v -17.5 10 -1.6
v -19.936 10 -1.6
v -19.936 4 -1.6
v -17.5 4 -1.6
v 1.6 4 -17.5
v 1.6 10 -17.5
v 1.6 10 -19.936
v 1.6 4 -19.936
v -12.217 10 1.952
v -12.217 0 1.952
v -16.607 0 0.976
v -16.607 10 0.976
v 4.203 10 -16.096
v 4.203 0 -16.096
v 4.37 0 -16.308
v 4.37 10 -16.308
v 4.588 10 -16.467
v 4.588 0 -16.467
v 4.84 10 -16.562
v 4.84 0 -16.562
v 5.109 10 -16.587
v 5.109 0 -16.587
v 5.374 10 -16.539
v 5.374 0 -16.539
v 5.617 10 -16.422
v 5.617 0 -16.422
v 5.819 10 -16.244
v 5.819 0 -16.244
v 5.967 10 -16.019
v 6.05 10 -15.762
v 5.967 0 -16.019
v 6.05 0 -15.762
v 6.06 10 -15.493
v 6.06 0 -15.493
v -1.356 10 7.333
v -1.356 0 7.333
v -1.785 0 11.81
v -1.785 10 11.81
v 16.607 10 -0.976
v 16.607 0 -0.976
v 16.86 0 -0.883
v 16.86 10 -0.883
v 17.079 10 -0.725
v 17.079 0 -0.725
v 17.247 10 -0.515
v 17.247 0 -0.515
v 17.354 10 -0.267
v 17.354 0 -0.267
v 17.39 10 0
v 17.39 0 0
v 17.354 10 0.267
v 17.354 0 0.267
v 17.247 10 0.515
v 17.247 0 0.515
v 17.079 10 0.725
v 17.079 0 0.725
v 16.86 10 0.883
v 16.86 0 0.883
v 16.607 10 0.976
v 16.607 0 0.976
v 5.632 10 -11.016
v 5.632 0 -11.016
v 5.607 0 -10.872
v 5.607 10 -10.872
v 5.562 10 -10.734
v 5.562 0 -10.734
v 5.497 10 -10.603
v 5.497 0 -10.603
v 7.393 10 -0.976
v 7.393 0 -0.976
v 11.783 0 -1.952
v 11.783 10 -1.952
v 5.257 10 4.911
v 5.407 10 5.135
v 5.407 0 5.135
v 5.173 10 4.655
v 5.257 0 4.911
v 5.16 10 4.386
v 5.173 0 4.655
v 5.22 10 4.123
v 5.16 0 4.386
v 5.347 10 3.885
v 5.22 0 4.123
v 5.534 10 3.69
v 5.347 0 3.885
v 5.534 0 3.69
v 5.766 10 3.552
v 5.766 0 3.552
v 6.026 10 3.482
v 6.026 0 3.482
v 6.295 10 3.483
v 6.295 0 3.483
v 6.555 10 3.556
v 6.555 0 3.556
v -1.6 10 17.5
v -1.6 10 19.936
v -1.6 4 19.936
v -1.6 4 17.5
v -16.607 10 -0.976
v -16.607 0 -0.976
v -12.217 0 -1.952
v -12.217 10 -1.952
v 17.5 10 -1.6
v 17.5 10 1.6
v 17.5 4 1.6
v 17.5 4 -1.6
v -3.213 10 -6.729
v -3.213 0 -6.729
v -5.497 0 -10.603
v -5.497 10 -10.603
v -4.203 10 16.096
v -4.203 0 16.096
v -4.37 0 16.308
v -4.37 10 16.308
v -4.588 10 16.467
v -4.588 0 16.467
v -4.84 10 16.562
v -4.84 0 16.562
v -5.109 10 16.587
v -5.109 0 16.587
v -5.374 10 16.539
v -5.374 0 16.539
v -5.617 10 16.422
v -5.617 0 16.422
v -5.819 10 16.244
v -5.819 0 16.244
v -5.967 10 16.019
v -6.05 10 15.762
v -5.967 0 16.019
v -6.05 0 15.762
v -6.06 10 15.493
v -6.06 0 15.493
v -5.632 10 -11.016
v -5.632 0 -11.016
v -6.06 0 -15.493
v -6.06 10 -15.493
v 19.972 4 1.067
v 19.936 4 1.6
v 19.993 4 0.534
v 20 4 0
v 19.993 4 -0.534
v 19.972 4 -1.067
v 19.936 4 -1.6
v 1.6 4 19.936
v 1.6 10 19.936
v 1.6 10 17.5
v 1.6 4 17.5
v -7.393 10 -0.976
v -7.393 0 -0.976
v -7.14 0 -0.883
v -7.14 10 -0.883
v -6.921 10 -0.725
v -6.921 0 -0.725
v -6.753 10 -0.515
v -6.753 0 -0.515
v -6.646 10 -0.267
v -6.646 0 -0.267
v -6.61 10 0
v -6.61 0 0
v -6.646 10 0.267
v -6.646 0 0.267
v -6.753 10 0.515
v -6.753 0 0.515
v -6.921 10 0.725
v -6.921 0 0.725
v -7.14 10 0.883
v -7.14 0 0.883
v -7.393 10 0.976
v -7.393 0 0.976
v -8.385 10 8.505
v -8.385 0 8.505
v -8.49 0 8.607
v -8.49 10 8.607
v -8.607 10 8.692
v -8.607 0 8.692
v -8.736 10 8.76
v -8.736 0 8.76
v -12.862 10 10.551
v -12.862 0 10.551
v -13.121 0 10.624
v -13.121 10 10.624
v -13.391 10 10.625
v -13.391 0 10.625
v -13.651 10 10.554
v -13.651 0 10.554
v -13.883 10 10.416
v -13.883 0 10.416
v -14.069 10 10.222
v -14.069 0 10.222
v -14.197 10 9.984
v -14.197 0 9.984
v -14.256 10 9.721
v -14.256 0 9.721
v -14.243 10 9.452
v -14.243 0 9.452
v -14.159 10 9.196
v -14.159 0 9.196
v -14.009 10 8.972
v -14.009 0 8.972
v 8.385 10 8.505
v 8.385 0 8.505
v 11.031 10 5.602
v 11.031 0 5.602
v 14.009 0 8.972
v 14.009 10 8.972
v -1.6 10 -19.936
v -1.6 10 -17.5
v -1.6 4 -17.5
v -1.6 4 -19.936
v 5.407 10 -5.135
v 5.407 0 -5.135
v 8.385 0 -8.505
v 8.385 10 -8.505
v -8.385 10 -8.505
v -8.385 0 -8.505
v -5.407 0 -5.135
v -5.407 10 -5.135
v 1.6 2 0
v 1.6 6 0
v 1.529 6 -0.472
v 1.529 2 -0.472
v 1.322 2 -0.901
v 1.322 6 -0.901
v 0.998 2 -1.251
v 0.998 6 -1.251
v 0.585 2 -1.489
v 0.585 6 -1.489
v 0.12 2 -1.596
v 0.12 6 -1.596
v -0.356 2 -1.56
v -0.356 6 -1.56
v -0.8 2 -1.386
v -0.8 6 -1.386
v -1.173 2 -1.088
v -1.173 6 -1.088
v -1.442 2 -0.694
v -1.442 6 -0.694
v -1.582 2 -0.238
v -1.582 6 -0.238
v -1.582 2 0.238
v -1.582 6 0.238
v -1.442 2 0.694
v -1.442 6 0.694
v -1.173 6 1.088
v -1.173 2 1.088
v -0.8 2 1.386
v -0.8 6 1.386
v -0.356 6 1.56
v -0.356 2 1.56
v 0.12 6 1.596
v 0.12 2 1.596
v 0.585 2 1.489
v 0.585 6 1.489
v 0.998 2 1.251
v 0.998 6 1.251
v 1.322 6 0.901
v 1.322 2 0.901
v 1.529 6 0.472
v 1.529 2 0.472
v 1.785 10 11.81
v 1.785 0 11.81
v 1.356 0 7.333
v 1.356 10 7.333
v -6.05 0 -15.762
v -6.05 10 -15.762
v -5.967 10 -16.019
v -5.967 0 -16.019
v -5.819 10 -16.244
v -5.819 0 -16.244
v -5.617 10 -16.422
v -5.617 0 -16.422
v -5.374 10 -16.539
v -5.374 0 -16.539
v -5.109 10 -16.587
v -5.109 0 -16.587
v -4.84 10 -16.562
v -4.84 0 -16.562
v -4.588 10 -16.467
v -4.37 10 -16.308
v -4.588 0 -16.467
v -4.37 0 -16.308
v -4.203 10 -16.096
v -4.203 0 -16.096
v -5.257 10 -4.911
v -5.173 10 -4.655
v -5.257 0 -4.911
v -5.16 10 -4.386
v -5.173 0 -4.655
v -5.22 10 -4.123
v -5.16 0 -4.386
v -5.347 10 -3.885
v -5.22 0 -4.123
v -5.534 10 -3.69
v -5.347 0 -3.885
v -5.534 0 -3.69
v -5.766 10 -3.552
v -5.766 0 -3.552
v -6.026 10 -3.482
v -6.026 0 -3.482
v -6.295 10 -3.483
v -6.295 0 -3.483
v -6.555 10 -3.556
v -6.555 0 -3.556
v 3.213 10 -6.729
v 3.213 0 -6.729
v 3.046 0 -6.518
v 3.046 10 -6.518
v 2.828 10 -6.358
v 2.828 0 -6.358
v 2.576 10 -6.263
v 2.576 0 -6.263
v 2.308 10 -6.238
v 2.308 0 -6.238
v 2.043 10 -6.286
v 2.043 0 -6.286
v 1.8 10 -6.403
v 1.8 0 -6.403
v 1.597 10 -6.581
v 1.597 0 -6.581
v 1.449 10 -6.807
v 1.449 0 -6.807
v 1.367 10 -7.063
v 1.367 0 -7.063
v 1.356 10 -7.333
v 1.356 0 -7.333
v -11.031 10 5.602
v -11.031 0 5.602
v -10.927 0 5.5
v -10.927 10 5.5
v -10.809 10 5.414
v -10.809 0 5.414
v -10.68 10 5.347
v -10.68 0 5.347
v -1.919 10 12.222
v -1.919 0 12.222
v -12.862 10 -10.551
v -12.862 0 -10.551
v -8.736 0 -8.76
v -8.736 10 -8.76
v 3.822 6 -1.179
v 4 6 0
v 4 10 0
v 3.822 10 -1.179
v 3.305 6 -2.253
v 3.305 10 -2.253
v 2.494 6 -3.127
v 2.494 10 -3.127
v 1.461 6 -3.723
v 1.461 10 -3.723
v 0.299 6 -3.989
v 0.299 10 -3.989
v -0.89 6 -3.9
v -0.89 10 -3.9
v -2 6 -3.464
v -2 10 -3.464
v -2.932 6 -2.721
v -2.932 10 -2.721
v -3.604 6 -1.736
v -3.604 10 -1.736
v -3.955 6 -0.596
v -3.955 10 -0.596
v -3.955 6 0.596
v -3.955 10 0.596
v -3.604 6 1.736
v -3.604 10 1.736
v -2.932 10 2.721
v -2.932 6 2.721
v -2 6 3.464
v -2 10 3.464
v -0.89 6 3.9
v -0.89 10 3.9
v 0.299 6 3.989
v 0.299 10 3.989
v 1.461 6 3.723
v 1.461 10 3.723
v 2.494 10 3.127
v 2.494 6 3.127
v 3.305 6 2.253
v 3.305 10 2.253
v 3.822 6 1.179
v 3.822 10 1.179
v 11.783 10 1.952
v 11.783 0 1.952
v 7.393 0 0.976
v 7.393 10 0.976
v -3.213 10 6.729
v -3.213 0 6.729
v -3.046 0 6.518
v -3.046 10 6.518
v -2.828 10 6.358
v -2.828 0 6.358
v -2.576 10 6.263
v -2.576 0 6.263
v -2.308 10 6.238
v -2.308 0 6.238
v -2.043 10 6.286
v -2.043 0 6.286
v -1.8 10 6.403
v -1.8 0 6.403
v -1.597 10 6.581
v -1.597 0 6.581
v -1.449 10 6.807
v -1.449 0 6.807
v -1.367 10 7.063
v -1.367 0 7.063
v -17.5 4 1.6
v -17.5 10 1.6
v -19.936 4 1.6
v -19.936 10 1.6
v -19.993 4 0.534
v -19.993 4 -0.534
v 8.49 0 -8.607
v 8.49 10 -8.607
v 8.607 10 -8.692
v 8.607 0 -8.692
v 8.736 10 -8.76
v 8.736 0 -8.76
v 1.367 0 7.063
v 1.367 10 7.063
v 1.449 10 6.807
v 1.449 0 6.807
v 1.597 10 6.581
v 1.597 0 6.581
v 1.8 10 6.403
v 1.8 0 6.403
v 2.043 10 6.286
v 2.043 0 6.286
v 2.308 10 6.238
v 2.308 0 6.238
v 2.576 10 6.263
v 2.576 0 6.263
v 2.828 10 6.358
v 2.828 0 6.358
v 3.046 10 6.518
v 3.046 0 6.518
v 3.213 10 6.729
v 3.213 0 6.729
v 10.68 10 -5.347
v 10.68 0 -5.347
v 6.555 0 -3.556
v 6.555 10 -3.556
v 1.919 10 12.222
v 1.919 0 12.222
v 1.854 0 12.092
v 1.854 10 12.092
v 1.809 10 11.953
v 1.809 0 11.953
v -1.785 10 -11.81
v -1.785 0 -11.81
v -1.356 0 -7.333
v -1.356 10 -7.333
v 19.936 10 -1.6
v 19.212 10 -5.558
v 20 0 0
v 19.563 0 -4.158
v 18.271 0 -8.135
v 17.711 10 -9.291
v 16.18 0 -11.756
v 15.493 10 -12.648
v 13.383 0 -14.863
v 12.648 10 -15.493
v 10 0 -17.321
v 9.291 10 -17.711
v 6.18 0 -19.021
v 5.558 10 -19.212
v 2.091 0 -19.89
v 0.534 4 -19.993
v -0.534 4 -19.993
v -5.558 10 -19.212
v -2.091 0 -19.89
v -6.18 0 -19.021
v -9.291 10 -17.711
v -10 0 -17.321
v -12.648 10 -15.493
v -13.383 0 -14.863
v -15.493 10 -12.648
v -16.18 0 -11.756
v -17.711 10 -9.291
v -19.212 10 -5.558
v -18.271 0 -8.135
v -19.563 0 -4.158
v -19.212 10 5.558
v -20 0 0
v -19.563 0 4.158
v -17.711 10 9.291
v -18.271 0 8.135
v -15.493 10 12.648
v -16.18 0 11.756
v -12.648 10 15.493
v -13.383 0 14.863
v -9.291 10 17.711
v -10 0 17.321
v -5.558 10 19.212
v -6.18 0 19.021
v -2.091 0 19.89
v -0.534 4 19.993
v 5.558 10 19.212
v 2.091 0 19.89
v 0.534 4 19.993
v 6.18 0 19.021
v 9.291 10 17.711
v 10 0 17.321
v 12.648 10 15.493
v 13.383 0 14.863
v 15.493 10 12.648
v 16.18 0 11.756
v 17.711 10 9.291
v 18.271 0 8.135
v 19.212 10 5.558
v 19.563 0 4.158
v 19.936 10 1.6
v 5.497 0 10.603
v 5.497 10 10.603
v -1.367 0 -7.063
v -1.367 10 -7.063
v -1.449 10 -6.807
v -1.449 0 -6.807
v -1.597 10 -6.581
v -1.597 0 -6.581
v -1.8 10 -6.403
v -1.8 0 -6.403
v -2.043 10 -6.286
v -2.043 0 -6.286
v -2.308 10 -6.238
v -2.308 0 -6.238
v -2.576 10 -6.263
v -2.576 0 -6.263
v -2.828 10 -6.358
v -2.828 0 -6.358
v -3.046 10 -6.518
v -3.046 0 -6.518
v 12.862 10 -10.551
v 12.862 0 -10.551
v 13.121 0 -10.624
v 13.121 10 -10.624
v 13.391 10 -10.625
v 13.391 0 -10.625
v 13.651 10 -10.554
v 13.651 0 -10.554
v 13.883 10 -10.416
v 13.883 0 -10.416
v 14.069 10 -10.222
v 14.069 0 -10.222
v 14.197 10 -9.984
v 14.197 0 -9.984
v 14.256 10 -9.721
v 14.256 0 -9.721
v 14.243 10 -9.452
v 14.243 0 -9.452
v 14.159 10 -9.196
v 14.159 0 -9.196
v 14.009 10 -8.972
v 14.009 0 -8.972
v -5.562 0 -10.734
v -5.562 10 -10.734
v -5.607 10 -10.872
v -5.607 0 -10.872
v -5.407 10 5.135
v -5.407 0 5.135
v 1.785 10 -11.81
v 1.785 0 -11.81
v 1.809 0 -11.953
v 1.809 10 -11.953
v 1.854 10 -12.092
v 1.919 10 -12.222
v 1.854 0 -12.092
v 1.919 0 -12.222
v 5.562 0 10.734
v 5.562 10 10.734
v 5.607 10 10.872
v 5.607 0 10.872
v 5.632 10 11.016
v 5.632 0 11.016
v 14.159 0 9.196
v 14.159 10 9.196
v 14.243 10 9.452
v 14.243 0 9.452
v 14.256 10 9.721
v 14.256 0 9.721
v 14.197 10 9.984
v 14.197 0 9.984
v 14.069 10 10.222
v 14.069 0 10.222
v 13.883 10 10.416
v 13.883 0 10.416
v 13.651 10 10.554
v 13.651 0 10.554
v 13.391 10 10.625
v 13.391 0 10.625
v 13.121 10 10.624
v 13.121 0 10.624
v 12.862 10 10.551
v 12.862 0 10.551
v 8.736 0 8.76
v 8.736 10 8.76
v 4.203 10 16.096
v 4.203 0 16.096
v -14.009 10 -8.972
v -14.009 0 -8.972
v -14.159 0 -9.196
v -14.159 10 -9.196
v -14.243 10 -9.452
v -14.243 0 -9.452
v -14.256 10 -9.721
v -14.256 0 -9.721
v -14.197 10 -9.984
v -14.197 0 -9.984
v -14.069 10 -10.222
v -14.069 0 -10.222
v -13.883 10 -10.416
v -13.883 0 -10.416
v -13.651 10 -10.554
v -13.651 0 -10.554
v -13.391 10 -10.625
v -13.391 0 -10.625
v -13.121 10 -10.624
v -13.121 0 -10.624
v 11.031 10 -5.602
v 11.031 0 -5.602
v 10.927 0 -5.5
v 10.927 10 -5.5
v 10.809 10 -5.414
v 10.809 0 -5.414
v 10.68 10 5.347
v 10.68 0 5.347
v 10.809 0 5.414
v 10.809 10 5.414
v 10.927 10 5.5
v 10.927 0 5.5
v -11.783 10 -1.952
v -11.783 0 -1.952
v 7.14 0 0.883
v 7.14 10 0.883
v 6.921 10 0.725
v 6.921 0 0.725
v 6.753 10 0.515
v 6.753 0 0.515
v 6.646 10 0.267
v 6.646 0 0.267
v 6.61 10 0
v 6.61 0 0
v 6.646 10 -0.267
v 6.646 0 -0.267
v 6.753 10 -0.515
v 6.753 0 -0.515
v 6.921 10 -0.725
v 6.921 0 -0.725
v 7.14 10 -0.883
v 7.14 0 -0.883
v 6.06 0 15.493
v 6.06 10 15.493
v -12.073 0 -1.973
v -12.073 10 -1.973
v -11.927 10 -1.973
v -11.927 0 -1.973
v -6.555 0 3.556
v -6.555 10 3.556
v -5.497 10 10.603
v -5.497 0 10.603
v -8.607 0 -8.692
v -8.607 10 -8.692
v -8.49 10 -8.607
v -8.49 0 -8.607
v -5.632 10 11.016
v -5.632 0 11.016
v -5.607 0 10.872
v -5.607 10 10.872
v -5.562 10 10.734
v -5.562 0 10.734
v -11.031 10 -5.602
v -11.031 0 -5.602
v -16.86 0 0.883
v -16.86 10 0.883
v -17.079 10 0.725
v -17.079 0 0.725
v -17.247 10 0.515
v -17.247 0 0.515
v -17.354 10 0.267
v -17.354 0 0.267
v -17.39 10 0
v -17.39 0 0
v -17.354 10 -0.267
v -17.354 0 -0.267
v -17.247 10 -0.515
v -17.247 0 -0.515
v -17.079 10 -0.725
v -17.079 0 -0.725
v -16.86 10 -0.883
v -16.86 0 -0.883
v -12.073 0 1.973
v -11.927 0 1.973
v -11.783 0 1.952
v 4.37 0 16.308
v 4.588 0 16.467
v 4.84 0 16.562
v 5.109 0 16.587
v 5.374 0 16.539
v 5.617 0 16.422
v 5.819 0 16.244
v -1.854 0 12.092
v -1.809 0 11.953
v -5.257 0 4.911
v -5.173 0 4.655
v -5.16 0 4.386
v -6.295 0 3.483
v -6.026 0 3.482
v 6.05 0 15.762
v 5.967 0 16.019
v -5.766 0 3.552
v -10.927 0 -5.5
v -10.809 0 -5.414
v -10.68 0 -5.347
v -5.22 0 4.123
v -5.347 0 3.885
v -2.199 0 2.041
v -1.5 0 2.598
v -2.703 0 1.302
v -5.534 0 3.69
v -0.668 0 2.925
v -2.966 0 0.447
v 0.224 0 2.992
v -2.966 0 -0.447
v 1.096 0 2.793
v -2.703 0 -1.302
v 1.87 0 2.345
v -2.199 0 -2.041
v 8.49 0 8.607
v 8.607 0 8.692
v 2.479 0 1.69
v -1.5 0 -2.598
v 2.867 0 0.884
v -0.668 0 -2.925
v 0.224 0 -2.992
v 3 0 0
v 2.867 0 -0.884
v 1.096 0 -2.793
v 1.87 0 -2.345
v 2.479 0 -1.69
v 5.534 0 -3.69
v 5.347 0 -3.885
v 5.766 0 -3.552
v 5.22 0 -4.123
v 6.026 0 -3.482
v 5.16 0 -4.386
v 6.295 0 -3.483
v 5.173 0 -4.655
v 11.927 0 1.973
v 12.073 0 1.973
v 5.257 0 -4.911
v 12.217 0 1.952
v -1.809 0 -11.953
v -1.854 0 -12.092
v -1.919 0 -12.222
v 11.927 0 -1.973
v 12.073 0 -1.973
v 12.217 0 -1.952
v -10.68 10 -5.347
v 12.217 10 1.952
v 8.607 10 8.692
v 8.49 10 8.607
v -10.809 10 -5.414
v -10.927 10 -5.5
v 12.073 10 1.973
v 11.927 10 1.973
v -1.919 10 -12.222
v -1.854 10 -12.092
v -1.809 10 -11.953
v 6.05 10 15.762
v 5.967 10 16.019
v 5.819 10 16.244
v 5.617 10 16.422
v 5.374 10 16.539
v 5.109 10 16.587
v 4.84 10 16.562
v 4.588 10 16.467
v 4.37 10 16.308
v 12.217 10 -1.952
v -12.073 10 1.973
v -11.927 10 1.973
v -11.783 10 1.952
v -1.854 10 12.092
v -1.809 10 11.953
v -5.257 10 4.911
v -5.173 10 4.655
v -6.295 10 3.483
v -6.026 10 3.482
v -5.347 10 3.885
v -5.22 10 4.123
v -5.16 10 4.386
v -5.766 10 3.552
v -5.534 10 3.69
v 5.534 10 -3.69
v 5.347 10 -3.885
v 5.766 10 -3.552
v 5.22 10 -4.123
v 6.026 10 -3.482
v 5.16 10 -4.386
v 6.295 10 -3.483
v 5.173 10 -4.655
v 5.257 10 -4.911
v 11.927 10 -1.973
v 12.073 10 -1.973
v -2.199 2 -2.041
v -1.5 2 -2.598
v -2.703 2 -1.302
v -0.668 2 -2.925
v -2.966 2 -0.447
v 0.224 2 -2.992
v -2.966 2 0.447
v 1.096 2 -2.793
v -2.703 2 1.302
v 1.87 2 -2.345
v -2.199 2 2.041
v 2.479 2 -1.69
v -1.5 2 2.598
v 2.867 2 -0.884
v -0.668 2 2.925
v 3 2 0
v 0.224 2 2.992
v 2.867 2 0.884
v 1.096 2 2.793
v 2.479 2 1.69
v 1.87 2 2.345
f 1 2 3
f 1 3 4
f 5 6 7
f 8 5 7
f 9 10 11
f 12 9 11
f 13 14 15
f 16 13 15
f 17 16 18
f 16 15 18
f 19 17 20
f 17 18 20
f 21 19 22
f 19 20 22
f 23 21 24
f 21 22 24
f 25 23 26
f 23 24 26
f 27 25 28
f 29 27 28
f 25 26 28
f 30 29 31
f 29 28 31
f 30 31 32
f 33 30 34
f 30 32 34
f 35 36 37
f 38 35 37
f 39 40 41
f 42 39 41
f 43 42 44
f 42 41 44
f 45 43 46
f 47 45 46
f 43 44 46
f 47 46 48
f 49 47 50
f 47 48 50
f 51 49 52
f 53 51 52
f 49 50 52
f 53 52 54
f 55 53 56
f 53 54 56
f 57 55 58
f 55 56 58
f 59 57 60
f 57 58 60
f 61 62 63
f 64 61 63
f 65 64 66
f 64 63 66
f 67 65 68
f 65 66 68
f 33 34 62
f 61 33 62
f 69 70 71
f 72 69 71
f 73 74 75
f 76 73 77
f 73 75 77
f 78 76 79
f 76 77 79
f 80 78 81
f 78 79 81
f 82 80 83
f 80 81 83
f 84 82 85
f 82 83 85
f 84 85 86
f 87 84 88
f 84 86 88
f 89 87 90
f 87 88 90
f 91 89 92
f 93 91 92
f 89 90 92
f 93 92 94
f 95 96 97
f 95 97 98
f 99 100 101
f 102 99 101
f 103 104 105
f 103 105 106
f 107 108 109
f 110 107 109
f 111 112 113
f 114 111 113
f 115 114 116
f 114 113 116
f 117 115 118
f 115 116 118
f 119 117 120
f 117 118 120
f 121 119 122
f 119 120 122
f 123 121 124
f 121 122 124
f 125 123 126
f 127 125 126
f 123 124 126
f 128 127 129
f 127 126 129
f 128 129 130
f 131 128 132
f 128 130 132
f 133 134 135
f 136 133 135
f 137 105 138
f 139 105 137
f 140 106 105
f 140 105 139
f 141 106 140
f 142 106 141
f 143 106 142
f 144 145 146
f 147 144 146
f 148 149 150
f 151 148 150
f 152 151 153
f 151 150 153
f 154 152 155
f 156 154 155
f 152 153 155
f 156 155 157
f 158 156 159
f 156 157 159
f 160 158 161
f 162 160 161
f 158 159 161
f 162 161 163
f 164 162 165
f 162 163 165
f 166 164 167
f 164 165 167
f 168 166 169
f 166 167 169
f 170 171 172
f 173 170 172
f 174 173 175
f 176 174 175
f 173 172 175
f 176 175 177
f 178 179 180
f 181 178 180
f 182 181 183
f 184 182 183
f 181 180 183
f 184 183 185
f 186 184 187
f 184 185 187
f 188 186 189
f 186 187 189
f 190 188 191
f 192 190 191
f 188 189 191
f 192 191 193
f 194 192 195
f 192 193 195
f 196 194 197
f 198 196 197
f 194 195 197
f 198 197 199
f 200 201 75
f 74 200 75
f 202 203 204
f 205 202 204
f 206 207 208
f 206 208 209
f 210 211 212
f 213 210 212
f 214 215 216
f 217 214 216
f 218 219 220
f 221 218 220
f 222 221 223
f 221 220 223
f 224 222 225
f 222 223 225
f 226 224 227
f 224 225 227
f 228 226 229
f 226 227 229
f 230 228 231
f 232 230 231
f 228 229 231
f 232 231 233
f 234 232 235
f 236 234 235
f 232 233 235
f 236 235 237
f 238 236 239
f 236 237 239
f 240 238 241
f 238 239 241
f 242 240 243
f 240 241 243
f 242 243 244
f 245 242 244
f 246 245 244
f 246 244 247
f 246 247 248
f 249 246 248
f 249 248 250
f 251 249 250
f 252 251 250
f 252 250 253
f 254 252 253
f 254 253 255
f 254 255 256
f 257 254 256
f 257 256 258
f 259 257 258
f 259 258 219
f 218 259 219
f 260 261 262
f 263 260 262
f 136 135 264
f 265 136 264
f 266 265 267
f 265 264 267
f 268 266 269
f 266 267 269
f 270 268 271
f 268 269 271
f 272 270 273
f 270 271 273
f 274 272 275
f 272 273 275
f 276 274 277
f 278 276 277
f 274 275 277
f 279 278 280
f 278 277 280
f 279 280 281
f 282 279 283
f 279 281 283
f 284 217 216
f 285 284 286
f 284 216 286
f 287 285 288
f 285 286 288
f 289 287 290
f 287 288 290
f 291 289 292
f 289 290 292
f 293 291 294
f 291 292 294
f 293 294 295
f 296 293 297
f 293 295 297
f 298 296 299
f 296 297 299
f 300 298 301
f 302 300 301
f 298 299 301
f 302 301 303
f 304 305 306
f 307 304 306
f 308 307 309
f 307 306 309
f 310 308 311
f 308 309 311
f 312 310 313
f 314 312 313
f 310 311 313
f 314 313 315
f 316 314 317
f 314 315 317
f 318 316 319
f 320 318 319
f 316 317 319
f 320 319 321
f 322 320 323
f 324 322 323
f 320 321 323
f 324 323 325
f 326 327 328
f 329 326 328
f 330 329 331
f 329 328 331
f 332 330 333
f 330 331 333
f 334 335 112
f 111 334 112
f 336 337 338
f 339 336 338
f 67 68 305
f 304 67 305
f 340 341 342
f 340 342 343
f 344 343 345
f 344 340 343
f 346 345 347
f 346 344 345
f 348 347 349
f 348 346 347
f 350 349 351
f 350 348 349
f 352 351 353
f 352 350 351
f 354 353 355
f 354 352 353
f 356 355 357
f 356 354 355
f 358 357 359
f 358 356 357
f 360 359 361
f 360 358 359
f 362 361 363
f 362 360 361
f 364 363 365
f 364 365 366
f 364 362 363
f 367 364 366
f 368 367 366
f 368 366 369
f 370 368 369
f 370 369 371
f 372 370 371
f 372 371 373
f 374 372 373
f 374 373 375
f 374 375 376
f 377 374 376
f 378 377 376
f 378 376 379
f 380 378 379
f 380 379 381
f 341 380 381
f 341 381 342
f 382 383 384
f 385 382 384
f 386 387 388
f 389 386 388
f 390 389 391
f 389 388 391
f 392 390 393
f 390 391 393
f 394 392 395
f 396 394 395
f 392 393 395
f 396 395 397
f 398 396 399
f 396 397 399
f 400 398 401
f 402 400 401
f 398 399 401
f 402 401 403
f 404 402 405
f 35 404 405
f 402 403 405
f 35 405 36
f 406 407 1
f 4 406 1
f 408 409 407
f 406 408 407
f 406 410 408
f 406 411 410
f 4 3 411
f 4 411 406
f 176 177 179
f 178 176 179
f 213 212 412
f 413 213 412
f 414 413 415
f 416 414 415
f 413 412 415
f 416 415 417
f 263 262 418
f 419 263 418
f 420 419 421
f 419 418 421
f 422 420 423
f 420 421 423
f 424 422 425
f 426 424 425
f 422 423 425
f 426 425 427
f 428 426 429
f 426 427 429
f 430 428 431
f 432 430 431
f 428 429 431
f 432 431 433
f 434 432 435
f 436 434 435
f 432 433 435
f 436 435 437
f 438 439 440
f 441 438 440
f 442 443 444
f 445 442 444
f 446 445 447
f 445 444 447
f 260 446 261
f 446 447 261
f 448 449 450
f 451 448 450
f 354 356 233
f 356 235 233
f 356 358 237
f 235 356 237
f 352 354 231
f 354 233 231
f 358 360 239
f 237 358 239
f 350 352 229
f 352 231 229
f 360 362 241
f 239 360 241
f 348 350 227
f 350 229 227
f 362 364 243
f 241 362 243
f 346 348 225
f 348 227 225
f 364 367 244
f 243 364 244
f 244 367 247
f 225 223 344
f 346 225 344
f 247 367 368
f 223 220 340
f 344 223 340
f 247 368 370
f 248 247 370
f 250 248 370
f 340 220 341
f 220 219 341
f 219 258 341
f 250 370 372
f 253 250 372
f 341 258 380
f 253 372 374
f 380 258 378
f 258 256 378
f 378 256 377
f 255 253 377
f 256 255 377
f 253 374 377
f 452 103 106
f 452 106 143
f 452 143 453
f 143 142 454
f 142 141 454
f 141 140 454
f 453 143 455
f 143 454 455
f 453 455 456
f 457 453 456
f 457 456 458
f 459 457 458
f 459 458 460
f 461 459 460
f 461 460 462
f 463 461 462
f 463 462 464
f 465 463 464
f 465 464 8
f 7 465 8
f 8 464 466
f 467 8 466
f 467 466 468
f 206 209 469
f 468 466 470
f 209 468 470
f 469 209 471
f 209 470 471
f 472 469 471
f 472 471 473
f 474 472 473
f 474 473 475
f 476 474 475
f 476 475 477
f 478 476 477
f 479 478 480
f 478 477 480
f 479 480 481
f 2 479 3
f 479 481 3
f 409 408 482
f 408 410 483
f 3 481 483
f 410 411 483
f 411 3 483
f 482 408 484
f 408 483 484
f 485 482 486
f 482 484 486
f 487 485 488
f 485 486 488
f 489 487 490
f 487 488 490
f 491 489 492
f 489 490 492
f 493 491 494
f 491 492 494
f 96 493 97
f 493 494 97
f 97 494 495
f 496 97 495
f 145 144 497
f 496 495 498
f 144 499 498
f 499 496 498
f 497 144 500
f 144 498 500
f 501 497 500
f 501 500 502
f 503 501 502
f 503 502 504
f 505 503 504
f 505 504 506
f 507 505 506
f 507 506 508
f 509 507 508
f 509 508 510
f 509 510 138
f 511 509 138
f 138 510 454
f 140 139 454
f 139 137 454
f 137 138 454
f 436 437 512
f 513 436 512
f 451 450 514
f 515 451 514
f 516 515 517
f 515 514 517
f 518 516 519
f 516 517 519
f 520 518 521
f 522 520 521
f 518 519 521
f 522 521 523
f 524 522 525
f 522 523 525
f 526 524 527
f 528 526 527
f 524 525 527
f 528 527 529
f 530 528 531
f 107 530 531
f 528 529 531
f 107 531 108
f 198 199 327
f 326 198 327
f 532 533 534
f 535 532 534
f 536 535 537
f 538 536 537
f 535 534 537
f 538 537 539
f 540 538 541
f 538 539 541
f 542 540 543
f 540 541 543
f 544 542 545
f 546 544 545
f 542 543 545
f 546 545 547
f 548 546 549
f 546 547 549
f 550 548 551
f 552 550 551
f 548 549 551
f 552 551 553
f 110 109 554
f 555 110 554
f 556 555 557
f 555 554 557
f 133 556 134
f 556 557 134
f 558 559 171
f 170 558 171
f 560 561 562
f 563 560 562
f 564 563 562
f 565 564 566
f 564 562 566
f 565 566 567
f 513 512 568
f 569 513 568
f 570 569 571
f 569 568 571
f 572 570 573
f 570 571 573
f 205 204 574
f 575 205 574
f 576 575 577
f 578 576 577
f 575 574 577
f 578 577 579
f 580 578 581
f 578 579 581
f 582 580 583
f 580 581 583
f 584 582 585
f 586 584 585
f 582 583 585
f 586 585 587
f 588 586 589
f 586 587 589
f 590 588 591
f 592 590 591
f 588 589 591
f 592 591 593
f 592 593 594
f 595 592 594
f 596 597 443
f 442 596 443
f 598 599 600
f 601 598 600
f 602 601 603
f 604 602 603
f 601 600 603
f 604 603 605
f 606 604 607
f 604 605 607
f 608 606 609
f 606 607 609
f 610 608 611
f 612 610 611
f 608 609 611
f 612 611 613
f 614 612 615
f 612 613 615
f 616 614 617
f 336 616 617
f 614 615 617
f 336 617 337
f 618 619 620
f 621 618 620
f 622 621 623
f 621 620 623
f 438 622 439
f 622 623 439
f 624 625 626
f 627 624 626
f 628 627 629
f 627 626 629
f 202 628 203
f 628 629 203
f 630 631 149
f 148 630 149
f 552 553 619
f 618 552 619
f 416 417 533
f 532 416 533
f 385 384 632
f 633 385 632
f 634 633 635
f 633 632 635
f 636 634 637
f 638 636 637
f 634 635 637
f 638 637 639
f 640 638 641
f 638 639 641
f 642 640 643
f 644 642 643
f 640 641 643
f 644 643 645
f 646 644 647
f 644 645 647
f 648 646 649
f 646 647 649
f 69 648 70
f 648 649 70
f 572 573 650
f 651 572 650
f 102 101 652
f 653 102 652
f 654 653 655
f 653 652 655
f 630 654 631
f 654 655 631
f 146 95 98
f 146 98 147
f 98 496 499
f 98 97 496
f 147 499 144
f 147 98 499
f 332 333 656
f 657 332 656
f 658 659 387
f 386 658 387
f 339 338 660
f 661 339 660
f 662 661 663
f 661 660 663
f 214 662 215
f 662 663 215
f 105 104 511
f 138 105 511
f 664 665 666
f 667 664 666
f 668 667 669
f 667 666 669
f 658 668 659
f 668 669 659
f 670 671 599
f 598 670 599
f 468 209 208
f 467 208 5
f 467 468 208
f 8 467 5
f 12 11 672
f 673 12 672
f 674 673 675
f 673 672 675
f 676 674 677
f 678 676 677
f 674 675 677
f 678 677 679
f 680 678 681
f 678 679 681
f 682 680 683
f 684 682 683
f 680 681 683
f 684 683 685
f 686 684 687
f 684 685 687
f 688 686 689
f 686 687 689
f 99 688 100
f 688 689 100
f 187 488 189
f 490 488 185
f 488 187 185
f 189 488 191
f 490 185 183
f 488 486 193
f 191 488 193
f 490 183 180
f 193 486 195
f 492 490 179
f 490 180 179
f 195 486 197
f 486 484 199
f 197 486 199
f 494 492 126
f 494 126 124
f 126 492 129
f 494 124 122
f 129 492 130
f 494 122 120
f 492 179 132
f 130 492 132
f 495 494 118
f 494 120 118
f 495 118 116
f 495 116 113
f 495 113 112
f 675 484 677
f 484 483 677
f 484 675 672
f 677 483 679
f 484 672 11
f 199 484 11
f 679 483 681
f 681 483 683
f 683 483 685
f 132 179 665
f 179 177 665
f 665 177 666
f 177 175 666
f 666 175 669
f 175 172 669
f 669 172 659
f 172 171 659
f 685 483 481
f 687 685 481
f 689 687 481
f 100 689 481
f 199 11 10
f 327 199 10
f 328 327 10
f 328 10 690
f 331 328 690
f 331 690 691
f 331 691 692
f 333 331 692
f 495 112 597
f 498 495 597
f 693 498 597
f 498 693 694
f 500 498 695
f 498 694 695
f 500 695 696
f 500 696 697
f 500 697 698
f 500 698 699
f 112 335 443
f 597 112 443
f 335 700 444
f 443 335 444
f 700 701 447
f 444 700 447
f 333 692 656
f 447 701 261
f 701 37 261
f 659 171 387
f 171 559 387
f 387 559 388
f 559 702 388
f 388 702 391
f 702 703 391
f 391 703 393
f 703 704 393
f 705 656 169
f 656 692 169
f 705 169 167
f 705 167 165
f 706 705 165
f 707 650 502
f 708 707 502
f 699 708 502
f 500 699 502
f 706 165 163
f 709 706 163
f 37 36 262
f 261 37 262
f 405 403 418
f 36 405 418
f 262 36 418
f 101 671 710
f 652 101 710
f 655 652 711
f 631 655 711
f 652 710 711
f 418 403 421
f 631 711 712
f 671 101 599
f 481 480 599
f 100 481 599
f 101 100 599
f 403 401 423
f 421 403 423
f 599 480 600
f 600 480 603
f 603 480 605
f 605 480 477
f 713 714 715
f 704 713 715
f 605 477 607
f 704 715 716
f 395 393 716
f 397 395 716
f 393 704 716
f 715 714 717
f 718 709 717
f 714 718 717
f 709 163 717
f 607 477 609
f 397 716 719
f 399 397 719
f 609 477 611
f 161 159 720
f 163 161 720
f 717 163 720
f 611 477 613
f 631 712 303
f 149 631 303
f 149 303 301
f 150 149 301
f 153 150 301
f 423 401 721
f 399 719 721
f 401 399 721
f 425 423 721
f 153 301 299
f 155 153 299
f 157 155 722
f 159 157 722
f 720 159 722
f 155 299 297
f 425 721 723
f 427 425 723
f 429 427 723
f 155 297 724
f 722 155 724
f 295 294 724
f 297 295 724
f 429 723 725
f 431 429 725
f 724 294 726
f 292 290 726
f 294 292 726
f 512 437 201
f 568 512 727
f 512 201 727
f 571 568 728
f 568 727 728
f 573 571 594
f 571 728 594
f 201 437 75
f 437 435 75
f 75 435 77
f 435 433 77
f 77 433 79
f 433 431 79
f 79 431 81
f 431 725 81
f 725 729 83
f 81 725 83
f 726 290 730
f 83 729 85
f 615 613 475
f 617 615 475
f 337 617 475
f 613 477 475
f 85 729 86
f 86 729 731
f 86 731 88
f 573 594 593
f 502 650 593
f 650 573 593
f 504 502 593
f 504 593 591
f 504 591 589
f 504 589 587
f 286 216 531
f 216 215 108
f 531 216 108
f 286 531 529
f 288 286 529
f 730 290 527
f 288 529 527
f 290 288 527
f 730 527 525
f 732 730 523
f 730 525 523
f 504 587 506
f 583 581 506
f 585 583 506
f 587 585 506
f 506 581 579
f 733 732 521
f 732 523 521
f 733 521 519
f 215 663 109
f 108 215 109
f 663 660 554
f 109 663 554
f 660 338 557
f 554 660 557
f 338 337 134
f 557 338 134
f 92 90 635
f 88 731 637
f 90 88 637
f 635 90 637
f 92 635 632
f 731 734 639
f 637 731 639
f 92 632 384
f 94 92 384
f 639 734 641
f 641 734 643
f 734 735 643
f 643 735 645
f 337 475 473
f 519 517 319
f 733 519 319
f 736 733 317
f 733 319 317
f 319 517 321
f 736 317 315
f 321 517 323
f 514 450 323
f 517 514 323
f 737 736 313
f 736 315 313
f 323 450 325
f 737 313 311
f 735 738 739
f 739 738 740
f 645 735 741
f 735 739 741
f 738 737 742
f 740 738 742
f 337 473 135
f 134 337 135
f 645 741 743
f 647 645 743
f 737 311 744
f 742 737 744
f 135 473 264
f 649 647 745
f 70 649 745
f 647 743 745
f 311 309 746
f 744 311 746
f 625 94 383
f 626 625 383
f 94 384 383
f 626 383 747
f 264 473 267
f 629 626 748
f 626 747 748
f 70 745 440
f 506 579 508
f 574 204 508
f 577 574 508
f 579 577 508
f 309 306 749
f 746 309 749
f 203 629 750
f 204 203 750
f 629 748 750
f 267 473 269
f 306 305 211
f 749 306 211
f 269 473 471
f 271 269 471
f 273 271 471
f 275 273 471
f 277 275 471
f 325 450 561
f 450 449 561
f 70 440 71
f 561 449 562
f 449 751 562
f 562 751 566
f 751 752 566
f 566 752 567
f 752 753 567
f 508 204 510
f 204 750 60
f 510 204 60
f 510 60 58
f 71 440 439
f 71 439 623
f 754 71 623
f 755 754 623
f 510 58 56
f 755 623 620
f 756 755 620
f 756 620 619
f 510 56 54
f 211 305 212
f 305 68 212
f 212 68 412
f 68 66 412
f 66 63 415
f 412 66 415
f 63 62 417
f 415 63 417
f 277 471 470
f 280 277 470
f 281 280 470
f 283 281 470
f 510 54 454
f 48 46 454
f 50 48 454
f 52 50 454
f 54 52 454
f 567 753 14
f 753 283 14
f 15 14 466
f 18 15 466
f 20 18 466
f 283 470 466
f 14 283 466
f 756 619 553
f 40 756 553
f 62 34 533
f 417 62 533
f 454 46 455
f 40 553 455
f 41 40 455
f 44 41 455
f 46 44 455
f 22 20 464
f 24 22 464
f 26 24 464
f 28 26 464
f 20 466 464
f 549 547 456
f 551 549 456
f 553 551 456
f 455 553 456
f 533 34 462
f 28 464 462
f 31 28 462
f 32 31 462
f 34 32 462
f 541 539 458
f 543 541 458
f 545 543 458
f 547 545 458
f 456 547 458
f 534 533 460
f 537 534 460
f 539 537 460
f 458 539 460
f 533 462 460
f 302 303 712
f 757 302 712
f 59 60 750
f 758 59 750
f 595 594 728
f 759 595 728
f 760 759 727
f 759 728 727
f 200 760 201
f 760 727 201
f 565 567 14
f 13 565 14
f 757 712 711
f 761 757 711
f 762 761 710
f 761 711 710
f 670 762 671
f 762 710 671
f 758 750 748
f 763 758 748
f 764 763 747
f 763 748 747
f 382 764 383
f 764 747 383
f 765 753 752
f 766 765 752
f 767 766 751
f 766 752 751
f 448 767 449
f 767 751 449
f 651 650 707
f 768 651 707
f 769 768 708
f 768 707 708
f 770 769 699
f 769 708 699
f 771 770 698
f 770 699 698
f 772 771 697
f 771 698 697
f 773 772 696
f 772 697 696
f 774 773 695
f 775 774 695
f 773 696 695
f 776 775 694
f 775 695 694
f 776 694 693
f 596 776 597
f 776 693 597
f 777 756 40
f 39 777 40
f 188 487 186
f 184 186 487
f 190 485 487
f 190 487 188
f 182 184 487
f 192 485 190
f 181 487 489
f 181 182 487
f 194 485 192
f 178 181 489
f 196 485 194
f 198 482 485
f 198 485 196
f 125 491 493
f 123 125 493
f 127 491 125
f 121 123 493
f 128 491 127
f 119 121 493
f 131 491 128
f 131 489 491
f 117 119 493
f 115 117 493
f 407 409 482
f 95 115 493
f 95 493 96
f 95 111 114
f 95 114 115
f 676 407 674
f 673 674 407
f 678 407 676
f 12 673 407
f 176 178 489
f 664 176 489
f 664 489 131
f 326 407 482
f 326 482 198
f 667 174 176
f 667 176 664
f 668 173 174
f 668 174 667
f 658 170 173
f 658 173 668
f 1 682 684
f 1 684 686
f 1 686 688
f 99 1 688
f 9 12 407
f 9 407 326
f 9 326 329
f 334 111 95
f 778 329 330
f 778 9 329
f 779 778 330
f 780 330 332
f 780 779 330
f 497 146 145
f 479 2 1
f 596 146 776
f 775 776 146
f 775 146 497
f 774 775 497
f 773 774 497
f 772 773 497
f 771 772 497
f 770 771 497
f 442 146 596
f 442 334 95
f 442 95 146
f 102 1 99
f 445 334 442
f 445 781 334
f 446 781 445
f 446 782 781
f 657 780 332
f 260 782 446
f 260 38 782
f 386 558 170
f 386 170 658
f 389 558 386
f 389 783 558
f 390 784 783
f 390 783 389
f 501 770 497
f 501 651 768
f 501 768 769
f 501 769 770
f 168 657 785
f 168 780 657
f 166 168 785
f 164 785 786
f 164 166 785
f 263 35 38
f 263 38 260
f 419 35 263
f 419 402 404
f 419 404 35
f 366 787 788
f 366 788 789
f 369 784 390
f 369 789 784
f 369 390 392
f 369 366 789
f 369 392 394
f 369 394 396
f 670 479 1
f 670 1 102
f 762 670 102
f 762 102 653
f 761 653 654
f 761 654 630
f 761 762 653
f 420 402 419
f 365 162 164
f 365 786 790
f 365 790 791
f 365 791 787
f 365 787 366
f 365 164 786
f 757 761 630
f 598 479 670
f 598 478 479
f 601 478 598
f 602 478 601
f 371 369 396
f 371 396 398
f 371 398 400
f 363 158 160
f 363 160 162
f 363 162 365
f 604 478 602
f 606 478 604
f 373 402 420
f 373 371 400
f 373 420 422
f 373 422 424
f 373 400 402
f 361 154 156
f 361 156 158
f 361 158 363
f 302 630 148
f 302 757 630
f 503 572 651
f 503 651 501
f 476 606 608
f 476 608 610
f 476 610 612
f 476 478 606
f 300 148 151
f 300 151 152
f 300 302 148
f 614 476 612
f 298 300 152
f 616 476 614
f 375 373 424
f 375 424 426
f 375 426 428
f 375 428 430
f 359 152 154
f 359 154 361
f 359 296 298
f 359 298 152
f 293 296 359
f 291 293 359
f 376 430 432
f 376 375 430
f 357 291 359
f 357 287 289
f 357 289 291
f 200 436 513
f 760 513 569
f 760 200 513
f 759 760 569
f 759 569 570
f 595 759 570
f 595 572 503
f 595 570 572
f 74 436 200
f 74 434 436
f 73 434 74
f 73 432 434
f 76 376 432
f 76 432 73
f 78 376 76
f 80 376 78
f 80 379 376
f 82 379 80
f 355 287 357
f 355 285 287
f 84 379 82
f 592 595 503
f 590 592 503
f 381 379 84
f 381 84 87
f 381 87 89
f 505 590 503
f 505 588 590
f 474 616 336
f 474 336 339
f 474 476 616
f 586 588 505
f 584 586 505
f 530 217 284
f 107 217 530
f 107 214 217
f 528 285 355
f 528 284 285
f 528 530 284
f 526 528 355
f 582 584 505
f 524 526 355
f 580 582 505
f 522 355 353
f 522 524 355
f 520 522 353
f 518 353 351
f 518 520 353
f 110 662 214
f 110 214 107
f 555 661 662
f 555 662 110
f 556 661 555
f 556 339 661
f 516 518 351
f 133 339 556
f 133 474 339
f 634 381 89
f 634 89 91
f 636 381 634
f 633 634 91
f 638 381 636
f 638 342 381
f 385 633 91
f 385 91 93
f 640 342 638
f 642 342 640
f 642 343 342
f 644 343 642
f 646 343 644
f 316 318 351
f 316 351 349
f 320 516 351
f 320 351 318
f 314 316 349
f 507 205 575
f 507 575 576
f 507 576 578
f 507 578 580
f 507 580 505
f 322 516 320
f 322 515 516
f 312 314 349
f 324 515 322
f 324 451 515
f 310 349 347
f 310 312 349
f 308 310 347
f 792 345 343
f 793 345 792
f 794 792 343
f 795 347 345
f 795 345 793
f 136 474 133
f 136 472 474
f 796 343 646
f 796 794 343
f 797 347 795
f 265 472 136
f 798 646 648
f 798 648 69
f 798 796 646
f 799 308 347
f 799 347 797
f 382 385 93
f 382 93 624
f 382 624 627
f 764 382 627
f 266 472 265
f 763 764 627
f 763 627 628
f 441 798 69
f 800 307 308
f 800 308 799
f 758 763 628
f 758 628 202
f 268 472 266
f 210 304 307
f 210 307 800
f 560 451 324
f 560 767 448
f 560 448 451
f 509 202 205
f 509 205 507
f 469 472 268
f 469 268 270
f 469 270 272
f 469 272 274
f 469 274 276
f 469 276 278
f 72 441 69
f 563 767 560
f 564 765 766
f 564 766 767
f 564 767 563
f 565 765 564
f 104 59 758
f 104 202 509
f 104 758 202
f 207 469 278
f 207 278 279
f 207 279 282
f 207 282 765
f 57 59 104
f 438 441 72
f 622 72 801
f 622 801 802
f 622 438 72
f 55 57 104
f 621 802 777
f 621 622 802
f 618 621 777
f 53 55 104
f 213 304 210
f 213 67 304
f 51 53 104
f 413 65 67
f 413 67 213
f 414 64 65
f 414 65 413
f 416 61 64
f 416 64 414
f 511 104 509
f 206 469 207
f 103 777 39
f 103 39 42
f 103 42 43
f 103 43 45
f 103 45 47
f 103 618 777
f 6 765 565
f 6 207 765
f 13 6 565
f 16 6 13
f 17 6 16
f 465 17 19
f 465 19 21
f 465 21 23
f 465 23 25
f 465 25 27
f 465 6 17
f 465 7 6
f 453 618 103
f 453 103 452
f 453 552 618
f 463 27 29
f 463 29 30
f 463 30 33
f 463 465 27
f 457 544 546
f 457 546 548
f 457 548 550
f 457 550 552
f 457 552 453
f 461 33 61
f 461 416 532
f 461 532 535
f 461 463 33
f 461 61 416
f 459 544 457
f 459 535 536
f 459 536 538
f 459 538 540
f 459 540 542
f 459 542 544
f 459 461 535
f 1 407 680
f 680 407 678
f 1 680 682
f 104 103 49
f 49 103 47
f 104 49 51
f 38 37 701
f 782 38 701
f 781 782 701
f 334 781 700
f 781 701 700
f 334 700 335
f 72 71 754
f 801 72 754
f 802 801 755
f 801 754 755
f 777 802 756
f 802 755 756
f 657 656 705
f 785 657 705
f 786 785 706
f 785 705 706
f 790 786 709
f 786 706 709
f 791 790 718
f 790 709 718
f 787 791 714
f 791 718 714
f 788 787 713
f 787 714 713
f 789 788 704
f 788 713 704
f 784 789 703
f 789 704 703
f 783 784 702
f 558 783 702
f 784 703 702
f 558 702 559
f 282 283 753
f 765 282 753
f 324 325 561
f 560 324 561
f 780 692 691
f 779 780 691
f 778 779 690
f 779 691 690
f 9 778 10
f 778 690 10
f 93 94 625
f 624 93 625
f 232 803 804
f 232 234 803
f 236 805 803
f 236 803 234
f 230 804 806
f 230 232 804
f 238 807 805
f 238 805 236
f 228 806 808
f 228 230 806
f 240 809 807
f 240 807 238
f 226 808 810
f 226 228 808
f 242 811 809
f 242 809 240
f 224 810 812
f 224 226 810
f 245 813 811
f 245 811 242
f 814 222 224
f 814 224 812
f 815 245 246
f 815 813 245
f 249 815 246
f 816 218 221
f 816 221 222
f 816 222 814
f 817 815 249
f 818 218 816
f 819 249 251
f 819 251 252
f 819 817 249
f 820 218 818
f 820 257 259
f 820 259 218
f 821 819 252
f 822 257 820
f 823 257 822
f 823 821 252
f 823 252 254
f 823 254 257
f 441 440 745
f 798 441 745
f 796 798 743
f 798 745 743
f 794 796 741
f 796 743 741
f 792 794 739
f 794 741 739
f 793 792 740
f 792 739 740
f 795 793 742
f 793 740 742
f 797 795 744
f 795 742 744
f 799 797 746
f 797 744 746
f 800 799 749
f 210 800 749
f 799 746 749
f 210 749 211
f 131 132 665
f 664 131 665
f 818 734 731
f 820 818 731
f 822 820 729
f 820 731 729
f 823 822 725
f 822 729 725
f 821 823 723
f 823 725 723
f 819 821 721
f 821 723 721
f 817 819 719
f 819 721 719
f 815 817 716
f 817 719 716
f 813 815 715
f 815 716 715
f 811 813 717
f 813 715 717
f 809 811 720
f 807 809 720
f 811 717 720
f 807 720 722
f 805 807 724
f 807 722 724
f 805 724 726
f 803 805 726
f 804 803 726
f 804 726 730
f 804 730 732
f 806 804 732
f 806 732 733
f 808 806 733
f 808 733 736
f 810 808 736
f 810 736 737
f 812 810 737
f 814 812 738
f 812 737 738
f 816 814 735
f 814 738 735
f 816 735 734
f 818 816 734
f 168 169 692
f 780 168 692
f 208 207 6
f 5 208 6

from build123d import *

# Parameters (mm, degrees)
SKETCH_1_R               = 20
SKETCH_1_R_2             = 4
EXTRUDE_1_DEPTH          = 10
SKETCH_4_R               = 20
EXTRUDE_2_DEPTH          = 6
SKETCH_5_R               = 1.6
CUT_EXTRUDE_2_DEPTH      = 5
CUT_EXTRUDE_2_DEPTH_BACK = 7
CUT_EXTRUDE_3_DEPTH      = 1
CUT_EXTRUDE_3_DEPTH_BACK = 11
SKETCH_8_W               = 3.2
SKETCH_8_H               = 5
SKETCH_8_W_2             = 5
SKETCH_8_H_2             = 3.2
CUT_EXTRUDE_4_DEPTH      = 6
SKETCH_9_R               = 3
CUT_EXTRUDE_5_DEPTH      = 2


with BuildPart() as part:
    # Эскиз1 → Бобышка-Вытянуть1 (new body)
    with BuildSketch(Plane(origin=(0, 0, 0), x_dir=(1, 0, 0), z_dir=(0, 1, 0))):
        Circle(SKETCH_1_R)
        Circle(SKETCH_1_R_2, mode=Mode.SUBTRACT)
    extrude(amount=EXTRUDE_1_DEPTH)

    # Эскиз4 → Бобышка-Вытянуть2 (add)
    with BuildSketch(Plane.XZ):
        Circle(SKETCH_4_R)
    extrude(amount=-EXTRUDE_2_DEPTH)

    # Эскиз5 → Вырез-Вытянуть2 (cut, two sides)
    with BuildSketch(Plane(origin=(0, 6, 0), x_dir=(1, 0, 0), z_dir=(0, 1, 0))) as cut_extrude_2_sk:
        Circle(SKETCH_5_R)
    extrude(amount=CUT_EXTRUDE_2_DEPTH, mode=Mode.SUBTRACT)
    extrude(cut_extrude_2_sk.sketch, amount=-CUT_EXTRUDE_2_DEPTH_BACK, mode=Mode.SUBTRACT)

    # Эскиз6 → Вырез-Вытянуть3 (cut, two sides)
    with BuildSketch(Plane.XZ) as cut_extrude_3_sk:
        with BuildLine():
            Line((-7.392841771, 0.97618706), (-11.783069542, 1.951793232))
            ThreePointArc((-11.783069542, 1.951793232), (-12, 1.975606171), (-12.216930458, 1.951793232))
            Line((-12.216930458, 1.951793232), (-16.607158229, 0.97618706))
            ThreePointArc((-16.607158229, 0.97618706), (-17.390227771, 0), (-16.607158229, -0.97618706))
            Line((-16.607158229, -0.97618706), (-12.216930458, -1.951793232))
            ThreePointArc((-12.216930458, -1.951793232), (-12, -1.975606171), (-11.783069542, -1.951793232))
            Line((-11.783069542, -1.951793232), (-7.392841771, -0.97618706))
            ThreePointArc((-7.392841771, -0.97618706), (-6.609772229, 0), (-7.392841771, 0.97618706))
        make_face()
        with BuildLine():
            Line((-5.407146272, 5.135155287), (-8.385468228, 8.504948397))
            ThreePointArc((-8.385468228, 8.504948397), (-8.546971761, 8.651721994), (-8.736469082, 8.759965445))
            Line((-8.736469082, 8.759965445), (-12.861684878, 10.551194611))
            ThreePointArc((-12.861684878, 10.551194611), (-14.068989803, 10.221719418), (-14.009261593, 8.971690768))
            Line((-14.009261593, 8.971690768), (-11.030939637, 5.601897658))
            ThreePointArc((-11.030939637, 5.601897658), (-10.869436104, 5.455124061), (-10.679938783, 5.34688061))
            Line((-10.679938783, 5.34688061), (-6.554722987, 3.555651444))
            ThreePointArc((-6.554722987, 3.555651444), (-5.347418062, 3.885126637), (-5.407146272, 5.135155287))
        make_face()
        with BuildLine():
            Line((-1.356104679, 7.332668731), (-1.784903063, 11.809502348))
            ThreePointArc((-1.784903063, 11.809502348), (-1.82929081, 12.023174077), (-1.918973459, 12.222128599))
            Line((-1.918973459, 12.222128599), (-4.203485056, 16.096004442))
            ThreePointArc((-4.203485056, 16.096004442), (-5.373875917, 16.539089442), (-6.060303186, 15.49268766))
            Line((-6.060303186, 15.49268766), (-5.631504802, 11.015854043))
            ThreePointArc((-5.631504802, 11.015854043), (-5.587117055, 10.802182314), (-5.497434406, 10.603227792))
            Line((-5.497434406, 10.603227792), (-3.212922809, 6.729351949))
            ThreePointArc((-3.212922809, 6.729351949), (-2.042531948, 6.286266949), (-1.356104679, 7.332668731))
        make_face()
        with BuildLine():
            Line((3.212922809, 6.729351949), (5.497434406, 10.603227792))
            ThreePointArc((5.497434406, 10.603227792), (5.587117055, 10.802182314), (5.631504802, 11.015854043))
            Line((5.631504802, 11.015854043), (6.060303186, 15.49268766))
            ThreePointArc((6.060303186, 15.49268766), (5.373875917, 16.539089442), (4.203485056, 16.096004442))
            Line((4.203485056, 16.096004442), (1.918973459, 12.222128599))
            ThreePointArc((1.918973459, 12.222128599), (1.82929081, 12.023174077), (1.784903063, 11.809502348))
            Line((1.784903063, 11.809502348), (1.356104679, 7.332668731))
            ThreePointArc((1.356104679, 7.332668731), (2.042531948, 6.286266949), (3.212922809, 6.729351949))
        make_face()
        with BuildLine():
            Line((6.554722987, 3.555651444), (10.679938783, 5.34688061))
            ThreePointArc((10.679938783, 5.34688061), (10.869436104, 5.455124061), (11.030939637, 5.601897658))
            Line((11.030939637, 5.601897658), (14.009261593, 8.971690768))
            ThreePointArc((14.009261593, 8.971690768), (14.068989803, 10.221719418), (12.861684878, 10.551194611))
            Line((12.861684878, 10.551194611), (8.736469082, 8.759965445))
            ThreePointArc((8.736469082, 8.759965445), (8.546971761, 8.651721994), (8.385468228, 8.504948397))
            Line((8.385468228, 8.504948397), (5.407146272, 5.135155287))
            ThreePointArc((5.407146272, 5.135155287), (5.347418062, 3.885126637), (6.554722987, 3.555651444))
        make_face()
        with BuildLine():
            Line((7.392841771, -0.97618706), (11.783069542, -1.951793232))
            ThreePointArc((11.783069542, -1.951793232), (12, -1.975606171), (12.216930458, -1.951793232))
            Line((12.216930458, -1.951793232), (16.607158229, -0.97618706))
            ThreePointArc((16.607158229, -0.97618706), (17.390227771, 0), (16.607158229, 0.97618706))
            Line((16.607158229, 0.97618706), (12.216930458, 1.951793232))
            ThreePointArc((12.216930458, 1.951793232), (12, 1.975606171), (11.783069542, 1.951793232))
            Line((11.783069542, 1.951793232), (7.392841771, 0.97618706))
            ThreePointArc((7.392841771, 0.97618706), (6.609772229, 0), (7.392841771, -0.97618706))
        make_face()
        with BuildLine():
            Line((5.407146272, -5.135155287), (8.385468228, -8.504948397))
            ThreePointArc((8.385468228, -8.504948397), (8.546971761, -8.651721994), (8.736469082, -8.759965445))
            Line((8.736469082, -8.759965445), (12.861684878, -10.551194611))
            ThreePointArc((12.861684878, -10.551194611), (14.068989803, -10.221719418), (14.009261593, -8.971690768))
            Line((14.009261593, -8.971690768), (11.030939637, -5.601897658))
            ThreePointArc((11.030939637, -5.601897658), (10.869436104, -5.455124061), (10.679938783, -5.34688061))
            Line((10.679938783, -5.34688061), (6.554722987, -3.555651444))
            ThreePointArc((6.554722987, -3.555651444), (5.347418062, -3.885126637), (5.407146272, -5.135155287))
        make_face()
        with BuildLine():
            Line((1.356104679, -7.332668731), (1.784903063, -11.809502348))
            ThreePointArc((1.784903063, -11.809502348), (1.82929081, -12.023174077), (1.918973459, -12.222128599))
            Line((1.918973459, -12.222128599), (4.203485056, -16.096004442))
            ThreePointArc((4.203485056, -16.096004442), (5.373875917, -16.539089442), (6.060303186, -15.49268766))
            Line((6.060303186, -15.49268766), (5.631504802, -11.015854043))
            ThreePointArc((5.631504802, -11.015854043), (5.587117055, -10.802182314), (5.497434406, -10.603227792))
            Line((5.497434406, -10.603227792), (3.212922809, -6.729351949))
            ThreePointArc((3.212922809, -6.729351949), (2.042531948, -6.286266949), (1.356104679, -7.332668731))
        make_face()
        with BuildLine():
            Line((-3.212922809, -6.729351949), (-5.497434406, -10.603227792))
            ThreePointArc((-5.497434406, -10.603227792), (-5.587117055, -10.802182314), (-5.631504802, -11.015854043))
            Line((-5.631504802, -11.015854043), (-6.060303186, -15.49268766))
            ThreePointArc((-6.060303186, -15.49268766), (-5.373875917, -16.539089442), (-4.203485056, -16.096004442))
            Line((-4.203485056, -16.096004442), (-1.918973459, -12.222128599))
            ThreePointArc((-1.918973459, -12.222128599), (-1.82929081, -12.023174077), (-1.784903063, -11.809502348))
            Line((-1.784903063, -11.809502348), (-1.356104679, -7.332668731))
            ThreePointArc((-1.356104679, -7.332668731), (-2.042531948, -6.286266949), (-3.212922809, -6.729351949))
        make_face()
        with BuildLine():
            Line((-6.554722987, -3.555651444), (-10.679938783, -5.34688061))
            ThreePointArc((-10.679938783, -5.34688061), (-10.869436104, -5.455124061), (-11.030939637, -5.601897658))
            Line((-11.030939637, -5.601897658), (-14.009261593, -8.971690768))
            ThreePointArc((-14.009261593, -8.971690768), (-14.068989803, -10.221719418), (-12.861684878, -10.551194611))
            Line((-12.861684878, -10.551194611), (-8.736469082, -8.759965445))
            ThreePointArc((-8.736469082, -8.759965445), (-8.546971761, -8.651721994), (-8.385468228, -8.504948397))
            Line((-8.385468228, -8.504948397), (-5.407146272, -5.135155287))
            ThreePointArc((-5.407146272, -5.135155287), (-5.347418062, -3.885126637), (-6.554722987, -3.555651444))
        make_face()
    extrude(amount=CUT_EXTRUDE_3_DEPTH, mode=Mode.SUBTRACT)
    extrude(cut_extrude_3_sk.sketch, amount=-CUT_EXTRUDE_3_DEPTH_BACK, mode=Mode.SUBTRACT)

    # Эскиз8 → Вырез-Вытянуть4 (cut)
    with BuildSketch(Plane(origin=(0, 10, 0), x_dir=(1, 0, 0), z_dir=(0, 1, 0))):
        with Locations((0, 20)):
            Rectangle(SKETCH_8_W, SKETCH_8_H)
        with Locations((-20, 0)):
            Rectangle(SKETCH_8_W_2, SKETCH_8_H_2)
        with Locations((20, 0)):
            Rectangle(SKETCH_8_W_2, SKETCH_8_H_2)
        with Locations((0, -20)):
            Rectangle(SKETCH_8_W, SKETCH_8_H)
    extrude(amount=-CUT_EXTRUDE_4_DEPTH, mode=Mode.SUBTRACT)

    # Эскиз9 → Вырез-Вытянуть5 (cut)
    with BuildSketch(Plane.XZ):
        Circle(SKETCH_9_R)
    extrude(amount=-CUT_EXTRUDE_5_DEPTH, mode=Mode.SUBTRACT)


solid = part.part
